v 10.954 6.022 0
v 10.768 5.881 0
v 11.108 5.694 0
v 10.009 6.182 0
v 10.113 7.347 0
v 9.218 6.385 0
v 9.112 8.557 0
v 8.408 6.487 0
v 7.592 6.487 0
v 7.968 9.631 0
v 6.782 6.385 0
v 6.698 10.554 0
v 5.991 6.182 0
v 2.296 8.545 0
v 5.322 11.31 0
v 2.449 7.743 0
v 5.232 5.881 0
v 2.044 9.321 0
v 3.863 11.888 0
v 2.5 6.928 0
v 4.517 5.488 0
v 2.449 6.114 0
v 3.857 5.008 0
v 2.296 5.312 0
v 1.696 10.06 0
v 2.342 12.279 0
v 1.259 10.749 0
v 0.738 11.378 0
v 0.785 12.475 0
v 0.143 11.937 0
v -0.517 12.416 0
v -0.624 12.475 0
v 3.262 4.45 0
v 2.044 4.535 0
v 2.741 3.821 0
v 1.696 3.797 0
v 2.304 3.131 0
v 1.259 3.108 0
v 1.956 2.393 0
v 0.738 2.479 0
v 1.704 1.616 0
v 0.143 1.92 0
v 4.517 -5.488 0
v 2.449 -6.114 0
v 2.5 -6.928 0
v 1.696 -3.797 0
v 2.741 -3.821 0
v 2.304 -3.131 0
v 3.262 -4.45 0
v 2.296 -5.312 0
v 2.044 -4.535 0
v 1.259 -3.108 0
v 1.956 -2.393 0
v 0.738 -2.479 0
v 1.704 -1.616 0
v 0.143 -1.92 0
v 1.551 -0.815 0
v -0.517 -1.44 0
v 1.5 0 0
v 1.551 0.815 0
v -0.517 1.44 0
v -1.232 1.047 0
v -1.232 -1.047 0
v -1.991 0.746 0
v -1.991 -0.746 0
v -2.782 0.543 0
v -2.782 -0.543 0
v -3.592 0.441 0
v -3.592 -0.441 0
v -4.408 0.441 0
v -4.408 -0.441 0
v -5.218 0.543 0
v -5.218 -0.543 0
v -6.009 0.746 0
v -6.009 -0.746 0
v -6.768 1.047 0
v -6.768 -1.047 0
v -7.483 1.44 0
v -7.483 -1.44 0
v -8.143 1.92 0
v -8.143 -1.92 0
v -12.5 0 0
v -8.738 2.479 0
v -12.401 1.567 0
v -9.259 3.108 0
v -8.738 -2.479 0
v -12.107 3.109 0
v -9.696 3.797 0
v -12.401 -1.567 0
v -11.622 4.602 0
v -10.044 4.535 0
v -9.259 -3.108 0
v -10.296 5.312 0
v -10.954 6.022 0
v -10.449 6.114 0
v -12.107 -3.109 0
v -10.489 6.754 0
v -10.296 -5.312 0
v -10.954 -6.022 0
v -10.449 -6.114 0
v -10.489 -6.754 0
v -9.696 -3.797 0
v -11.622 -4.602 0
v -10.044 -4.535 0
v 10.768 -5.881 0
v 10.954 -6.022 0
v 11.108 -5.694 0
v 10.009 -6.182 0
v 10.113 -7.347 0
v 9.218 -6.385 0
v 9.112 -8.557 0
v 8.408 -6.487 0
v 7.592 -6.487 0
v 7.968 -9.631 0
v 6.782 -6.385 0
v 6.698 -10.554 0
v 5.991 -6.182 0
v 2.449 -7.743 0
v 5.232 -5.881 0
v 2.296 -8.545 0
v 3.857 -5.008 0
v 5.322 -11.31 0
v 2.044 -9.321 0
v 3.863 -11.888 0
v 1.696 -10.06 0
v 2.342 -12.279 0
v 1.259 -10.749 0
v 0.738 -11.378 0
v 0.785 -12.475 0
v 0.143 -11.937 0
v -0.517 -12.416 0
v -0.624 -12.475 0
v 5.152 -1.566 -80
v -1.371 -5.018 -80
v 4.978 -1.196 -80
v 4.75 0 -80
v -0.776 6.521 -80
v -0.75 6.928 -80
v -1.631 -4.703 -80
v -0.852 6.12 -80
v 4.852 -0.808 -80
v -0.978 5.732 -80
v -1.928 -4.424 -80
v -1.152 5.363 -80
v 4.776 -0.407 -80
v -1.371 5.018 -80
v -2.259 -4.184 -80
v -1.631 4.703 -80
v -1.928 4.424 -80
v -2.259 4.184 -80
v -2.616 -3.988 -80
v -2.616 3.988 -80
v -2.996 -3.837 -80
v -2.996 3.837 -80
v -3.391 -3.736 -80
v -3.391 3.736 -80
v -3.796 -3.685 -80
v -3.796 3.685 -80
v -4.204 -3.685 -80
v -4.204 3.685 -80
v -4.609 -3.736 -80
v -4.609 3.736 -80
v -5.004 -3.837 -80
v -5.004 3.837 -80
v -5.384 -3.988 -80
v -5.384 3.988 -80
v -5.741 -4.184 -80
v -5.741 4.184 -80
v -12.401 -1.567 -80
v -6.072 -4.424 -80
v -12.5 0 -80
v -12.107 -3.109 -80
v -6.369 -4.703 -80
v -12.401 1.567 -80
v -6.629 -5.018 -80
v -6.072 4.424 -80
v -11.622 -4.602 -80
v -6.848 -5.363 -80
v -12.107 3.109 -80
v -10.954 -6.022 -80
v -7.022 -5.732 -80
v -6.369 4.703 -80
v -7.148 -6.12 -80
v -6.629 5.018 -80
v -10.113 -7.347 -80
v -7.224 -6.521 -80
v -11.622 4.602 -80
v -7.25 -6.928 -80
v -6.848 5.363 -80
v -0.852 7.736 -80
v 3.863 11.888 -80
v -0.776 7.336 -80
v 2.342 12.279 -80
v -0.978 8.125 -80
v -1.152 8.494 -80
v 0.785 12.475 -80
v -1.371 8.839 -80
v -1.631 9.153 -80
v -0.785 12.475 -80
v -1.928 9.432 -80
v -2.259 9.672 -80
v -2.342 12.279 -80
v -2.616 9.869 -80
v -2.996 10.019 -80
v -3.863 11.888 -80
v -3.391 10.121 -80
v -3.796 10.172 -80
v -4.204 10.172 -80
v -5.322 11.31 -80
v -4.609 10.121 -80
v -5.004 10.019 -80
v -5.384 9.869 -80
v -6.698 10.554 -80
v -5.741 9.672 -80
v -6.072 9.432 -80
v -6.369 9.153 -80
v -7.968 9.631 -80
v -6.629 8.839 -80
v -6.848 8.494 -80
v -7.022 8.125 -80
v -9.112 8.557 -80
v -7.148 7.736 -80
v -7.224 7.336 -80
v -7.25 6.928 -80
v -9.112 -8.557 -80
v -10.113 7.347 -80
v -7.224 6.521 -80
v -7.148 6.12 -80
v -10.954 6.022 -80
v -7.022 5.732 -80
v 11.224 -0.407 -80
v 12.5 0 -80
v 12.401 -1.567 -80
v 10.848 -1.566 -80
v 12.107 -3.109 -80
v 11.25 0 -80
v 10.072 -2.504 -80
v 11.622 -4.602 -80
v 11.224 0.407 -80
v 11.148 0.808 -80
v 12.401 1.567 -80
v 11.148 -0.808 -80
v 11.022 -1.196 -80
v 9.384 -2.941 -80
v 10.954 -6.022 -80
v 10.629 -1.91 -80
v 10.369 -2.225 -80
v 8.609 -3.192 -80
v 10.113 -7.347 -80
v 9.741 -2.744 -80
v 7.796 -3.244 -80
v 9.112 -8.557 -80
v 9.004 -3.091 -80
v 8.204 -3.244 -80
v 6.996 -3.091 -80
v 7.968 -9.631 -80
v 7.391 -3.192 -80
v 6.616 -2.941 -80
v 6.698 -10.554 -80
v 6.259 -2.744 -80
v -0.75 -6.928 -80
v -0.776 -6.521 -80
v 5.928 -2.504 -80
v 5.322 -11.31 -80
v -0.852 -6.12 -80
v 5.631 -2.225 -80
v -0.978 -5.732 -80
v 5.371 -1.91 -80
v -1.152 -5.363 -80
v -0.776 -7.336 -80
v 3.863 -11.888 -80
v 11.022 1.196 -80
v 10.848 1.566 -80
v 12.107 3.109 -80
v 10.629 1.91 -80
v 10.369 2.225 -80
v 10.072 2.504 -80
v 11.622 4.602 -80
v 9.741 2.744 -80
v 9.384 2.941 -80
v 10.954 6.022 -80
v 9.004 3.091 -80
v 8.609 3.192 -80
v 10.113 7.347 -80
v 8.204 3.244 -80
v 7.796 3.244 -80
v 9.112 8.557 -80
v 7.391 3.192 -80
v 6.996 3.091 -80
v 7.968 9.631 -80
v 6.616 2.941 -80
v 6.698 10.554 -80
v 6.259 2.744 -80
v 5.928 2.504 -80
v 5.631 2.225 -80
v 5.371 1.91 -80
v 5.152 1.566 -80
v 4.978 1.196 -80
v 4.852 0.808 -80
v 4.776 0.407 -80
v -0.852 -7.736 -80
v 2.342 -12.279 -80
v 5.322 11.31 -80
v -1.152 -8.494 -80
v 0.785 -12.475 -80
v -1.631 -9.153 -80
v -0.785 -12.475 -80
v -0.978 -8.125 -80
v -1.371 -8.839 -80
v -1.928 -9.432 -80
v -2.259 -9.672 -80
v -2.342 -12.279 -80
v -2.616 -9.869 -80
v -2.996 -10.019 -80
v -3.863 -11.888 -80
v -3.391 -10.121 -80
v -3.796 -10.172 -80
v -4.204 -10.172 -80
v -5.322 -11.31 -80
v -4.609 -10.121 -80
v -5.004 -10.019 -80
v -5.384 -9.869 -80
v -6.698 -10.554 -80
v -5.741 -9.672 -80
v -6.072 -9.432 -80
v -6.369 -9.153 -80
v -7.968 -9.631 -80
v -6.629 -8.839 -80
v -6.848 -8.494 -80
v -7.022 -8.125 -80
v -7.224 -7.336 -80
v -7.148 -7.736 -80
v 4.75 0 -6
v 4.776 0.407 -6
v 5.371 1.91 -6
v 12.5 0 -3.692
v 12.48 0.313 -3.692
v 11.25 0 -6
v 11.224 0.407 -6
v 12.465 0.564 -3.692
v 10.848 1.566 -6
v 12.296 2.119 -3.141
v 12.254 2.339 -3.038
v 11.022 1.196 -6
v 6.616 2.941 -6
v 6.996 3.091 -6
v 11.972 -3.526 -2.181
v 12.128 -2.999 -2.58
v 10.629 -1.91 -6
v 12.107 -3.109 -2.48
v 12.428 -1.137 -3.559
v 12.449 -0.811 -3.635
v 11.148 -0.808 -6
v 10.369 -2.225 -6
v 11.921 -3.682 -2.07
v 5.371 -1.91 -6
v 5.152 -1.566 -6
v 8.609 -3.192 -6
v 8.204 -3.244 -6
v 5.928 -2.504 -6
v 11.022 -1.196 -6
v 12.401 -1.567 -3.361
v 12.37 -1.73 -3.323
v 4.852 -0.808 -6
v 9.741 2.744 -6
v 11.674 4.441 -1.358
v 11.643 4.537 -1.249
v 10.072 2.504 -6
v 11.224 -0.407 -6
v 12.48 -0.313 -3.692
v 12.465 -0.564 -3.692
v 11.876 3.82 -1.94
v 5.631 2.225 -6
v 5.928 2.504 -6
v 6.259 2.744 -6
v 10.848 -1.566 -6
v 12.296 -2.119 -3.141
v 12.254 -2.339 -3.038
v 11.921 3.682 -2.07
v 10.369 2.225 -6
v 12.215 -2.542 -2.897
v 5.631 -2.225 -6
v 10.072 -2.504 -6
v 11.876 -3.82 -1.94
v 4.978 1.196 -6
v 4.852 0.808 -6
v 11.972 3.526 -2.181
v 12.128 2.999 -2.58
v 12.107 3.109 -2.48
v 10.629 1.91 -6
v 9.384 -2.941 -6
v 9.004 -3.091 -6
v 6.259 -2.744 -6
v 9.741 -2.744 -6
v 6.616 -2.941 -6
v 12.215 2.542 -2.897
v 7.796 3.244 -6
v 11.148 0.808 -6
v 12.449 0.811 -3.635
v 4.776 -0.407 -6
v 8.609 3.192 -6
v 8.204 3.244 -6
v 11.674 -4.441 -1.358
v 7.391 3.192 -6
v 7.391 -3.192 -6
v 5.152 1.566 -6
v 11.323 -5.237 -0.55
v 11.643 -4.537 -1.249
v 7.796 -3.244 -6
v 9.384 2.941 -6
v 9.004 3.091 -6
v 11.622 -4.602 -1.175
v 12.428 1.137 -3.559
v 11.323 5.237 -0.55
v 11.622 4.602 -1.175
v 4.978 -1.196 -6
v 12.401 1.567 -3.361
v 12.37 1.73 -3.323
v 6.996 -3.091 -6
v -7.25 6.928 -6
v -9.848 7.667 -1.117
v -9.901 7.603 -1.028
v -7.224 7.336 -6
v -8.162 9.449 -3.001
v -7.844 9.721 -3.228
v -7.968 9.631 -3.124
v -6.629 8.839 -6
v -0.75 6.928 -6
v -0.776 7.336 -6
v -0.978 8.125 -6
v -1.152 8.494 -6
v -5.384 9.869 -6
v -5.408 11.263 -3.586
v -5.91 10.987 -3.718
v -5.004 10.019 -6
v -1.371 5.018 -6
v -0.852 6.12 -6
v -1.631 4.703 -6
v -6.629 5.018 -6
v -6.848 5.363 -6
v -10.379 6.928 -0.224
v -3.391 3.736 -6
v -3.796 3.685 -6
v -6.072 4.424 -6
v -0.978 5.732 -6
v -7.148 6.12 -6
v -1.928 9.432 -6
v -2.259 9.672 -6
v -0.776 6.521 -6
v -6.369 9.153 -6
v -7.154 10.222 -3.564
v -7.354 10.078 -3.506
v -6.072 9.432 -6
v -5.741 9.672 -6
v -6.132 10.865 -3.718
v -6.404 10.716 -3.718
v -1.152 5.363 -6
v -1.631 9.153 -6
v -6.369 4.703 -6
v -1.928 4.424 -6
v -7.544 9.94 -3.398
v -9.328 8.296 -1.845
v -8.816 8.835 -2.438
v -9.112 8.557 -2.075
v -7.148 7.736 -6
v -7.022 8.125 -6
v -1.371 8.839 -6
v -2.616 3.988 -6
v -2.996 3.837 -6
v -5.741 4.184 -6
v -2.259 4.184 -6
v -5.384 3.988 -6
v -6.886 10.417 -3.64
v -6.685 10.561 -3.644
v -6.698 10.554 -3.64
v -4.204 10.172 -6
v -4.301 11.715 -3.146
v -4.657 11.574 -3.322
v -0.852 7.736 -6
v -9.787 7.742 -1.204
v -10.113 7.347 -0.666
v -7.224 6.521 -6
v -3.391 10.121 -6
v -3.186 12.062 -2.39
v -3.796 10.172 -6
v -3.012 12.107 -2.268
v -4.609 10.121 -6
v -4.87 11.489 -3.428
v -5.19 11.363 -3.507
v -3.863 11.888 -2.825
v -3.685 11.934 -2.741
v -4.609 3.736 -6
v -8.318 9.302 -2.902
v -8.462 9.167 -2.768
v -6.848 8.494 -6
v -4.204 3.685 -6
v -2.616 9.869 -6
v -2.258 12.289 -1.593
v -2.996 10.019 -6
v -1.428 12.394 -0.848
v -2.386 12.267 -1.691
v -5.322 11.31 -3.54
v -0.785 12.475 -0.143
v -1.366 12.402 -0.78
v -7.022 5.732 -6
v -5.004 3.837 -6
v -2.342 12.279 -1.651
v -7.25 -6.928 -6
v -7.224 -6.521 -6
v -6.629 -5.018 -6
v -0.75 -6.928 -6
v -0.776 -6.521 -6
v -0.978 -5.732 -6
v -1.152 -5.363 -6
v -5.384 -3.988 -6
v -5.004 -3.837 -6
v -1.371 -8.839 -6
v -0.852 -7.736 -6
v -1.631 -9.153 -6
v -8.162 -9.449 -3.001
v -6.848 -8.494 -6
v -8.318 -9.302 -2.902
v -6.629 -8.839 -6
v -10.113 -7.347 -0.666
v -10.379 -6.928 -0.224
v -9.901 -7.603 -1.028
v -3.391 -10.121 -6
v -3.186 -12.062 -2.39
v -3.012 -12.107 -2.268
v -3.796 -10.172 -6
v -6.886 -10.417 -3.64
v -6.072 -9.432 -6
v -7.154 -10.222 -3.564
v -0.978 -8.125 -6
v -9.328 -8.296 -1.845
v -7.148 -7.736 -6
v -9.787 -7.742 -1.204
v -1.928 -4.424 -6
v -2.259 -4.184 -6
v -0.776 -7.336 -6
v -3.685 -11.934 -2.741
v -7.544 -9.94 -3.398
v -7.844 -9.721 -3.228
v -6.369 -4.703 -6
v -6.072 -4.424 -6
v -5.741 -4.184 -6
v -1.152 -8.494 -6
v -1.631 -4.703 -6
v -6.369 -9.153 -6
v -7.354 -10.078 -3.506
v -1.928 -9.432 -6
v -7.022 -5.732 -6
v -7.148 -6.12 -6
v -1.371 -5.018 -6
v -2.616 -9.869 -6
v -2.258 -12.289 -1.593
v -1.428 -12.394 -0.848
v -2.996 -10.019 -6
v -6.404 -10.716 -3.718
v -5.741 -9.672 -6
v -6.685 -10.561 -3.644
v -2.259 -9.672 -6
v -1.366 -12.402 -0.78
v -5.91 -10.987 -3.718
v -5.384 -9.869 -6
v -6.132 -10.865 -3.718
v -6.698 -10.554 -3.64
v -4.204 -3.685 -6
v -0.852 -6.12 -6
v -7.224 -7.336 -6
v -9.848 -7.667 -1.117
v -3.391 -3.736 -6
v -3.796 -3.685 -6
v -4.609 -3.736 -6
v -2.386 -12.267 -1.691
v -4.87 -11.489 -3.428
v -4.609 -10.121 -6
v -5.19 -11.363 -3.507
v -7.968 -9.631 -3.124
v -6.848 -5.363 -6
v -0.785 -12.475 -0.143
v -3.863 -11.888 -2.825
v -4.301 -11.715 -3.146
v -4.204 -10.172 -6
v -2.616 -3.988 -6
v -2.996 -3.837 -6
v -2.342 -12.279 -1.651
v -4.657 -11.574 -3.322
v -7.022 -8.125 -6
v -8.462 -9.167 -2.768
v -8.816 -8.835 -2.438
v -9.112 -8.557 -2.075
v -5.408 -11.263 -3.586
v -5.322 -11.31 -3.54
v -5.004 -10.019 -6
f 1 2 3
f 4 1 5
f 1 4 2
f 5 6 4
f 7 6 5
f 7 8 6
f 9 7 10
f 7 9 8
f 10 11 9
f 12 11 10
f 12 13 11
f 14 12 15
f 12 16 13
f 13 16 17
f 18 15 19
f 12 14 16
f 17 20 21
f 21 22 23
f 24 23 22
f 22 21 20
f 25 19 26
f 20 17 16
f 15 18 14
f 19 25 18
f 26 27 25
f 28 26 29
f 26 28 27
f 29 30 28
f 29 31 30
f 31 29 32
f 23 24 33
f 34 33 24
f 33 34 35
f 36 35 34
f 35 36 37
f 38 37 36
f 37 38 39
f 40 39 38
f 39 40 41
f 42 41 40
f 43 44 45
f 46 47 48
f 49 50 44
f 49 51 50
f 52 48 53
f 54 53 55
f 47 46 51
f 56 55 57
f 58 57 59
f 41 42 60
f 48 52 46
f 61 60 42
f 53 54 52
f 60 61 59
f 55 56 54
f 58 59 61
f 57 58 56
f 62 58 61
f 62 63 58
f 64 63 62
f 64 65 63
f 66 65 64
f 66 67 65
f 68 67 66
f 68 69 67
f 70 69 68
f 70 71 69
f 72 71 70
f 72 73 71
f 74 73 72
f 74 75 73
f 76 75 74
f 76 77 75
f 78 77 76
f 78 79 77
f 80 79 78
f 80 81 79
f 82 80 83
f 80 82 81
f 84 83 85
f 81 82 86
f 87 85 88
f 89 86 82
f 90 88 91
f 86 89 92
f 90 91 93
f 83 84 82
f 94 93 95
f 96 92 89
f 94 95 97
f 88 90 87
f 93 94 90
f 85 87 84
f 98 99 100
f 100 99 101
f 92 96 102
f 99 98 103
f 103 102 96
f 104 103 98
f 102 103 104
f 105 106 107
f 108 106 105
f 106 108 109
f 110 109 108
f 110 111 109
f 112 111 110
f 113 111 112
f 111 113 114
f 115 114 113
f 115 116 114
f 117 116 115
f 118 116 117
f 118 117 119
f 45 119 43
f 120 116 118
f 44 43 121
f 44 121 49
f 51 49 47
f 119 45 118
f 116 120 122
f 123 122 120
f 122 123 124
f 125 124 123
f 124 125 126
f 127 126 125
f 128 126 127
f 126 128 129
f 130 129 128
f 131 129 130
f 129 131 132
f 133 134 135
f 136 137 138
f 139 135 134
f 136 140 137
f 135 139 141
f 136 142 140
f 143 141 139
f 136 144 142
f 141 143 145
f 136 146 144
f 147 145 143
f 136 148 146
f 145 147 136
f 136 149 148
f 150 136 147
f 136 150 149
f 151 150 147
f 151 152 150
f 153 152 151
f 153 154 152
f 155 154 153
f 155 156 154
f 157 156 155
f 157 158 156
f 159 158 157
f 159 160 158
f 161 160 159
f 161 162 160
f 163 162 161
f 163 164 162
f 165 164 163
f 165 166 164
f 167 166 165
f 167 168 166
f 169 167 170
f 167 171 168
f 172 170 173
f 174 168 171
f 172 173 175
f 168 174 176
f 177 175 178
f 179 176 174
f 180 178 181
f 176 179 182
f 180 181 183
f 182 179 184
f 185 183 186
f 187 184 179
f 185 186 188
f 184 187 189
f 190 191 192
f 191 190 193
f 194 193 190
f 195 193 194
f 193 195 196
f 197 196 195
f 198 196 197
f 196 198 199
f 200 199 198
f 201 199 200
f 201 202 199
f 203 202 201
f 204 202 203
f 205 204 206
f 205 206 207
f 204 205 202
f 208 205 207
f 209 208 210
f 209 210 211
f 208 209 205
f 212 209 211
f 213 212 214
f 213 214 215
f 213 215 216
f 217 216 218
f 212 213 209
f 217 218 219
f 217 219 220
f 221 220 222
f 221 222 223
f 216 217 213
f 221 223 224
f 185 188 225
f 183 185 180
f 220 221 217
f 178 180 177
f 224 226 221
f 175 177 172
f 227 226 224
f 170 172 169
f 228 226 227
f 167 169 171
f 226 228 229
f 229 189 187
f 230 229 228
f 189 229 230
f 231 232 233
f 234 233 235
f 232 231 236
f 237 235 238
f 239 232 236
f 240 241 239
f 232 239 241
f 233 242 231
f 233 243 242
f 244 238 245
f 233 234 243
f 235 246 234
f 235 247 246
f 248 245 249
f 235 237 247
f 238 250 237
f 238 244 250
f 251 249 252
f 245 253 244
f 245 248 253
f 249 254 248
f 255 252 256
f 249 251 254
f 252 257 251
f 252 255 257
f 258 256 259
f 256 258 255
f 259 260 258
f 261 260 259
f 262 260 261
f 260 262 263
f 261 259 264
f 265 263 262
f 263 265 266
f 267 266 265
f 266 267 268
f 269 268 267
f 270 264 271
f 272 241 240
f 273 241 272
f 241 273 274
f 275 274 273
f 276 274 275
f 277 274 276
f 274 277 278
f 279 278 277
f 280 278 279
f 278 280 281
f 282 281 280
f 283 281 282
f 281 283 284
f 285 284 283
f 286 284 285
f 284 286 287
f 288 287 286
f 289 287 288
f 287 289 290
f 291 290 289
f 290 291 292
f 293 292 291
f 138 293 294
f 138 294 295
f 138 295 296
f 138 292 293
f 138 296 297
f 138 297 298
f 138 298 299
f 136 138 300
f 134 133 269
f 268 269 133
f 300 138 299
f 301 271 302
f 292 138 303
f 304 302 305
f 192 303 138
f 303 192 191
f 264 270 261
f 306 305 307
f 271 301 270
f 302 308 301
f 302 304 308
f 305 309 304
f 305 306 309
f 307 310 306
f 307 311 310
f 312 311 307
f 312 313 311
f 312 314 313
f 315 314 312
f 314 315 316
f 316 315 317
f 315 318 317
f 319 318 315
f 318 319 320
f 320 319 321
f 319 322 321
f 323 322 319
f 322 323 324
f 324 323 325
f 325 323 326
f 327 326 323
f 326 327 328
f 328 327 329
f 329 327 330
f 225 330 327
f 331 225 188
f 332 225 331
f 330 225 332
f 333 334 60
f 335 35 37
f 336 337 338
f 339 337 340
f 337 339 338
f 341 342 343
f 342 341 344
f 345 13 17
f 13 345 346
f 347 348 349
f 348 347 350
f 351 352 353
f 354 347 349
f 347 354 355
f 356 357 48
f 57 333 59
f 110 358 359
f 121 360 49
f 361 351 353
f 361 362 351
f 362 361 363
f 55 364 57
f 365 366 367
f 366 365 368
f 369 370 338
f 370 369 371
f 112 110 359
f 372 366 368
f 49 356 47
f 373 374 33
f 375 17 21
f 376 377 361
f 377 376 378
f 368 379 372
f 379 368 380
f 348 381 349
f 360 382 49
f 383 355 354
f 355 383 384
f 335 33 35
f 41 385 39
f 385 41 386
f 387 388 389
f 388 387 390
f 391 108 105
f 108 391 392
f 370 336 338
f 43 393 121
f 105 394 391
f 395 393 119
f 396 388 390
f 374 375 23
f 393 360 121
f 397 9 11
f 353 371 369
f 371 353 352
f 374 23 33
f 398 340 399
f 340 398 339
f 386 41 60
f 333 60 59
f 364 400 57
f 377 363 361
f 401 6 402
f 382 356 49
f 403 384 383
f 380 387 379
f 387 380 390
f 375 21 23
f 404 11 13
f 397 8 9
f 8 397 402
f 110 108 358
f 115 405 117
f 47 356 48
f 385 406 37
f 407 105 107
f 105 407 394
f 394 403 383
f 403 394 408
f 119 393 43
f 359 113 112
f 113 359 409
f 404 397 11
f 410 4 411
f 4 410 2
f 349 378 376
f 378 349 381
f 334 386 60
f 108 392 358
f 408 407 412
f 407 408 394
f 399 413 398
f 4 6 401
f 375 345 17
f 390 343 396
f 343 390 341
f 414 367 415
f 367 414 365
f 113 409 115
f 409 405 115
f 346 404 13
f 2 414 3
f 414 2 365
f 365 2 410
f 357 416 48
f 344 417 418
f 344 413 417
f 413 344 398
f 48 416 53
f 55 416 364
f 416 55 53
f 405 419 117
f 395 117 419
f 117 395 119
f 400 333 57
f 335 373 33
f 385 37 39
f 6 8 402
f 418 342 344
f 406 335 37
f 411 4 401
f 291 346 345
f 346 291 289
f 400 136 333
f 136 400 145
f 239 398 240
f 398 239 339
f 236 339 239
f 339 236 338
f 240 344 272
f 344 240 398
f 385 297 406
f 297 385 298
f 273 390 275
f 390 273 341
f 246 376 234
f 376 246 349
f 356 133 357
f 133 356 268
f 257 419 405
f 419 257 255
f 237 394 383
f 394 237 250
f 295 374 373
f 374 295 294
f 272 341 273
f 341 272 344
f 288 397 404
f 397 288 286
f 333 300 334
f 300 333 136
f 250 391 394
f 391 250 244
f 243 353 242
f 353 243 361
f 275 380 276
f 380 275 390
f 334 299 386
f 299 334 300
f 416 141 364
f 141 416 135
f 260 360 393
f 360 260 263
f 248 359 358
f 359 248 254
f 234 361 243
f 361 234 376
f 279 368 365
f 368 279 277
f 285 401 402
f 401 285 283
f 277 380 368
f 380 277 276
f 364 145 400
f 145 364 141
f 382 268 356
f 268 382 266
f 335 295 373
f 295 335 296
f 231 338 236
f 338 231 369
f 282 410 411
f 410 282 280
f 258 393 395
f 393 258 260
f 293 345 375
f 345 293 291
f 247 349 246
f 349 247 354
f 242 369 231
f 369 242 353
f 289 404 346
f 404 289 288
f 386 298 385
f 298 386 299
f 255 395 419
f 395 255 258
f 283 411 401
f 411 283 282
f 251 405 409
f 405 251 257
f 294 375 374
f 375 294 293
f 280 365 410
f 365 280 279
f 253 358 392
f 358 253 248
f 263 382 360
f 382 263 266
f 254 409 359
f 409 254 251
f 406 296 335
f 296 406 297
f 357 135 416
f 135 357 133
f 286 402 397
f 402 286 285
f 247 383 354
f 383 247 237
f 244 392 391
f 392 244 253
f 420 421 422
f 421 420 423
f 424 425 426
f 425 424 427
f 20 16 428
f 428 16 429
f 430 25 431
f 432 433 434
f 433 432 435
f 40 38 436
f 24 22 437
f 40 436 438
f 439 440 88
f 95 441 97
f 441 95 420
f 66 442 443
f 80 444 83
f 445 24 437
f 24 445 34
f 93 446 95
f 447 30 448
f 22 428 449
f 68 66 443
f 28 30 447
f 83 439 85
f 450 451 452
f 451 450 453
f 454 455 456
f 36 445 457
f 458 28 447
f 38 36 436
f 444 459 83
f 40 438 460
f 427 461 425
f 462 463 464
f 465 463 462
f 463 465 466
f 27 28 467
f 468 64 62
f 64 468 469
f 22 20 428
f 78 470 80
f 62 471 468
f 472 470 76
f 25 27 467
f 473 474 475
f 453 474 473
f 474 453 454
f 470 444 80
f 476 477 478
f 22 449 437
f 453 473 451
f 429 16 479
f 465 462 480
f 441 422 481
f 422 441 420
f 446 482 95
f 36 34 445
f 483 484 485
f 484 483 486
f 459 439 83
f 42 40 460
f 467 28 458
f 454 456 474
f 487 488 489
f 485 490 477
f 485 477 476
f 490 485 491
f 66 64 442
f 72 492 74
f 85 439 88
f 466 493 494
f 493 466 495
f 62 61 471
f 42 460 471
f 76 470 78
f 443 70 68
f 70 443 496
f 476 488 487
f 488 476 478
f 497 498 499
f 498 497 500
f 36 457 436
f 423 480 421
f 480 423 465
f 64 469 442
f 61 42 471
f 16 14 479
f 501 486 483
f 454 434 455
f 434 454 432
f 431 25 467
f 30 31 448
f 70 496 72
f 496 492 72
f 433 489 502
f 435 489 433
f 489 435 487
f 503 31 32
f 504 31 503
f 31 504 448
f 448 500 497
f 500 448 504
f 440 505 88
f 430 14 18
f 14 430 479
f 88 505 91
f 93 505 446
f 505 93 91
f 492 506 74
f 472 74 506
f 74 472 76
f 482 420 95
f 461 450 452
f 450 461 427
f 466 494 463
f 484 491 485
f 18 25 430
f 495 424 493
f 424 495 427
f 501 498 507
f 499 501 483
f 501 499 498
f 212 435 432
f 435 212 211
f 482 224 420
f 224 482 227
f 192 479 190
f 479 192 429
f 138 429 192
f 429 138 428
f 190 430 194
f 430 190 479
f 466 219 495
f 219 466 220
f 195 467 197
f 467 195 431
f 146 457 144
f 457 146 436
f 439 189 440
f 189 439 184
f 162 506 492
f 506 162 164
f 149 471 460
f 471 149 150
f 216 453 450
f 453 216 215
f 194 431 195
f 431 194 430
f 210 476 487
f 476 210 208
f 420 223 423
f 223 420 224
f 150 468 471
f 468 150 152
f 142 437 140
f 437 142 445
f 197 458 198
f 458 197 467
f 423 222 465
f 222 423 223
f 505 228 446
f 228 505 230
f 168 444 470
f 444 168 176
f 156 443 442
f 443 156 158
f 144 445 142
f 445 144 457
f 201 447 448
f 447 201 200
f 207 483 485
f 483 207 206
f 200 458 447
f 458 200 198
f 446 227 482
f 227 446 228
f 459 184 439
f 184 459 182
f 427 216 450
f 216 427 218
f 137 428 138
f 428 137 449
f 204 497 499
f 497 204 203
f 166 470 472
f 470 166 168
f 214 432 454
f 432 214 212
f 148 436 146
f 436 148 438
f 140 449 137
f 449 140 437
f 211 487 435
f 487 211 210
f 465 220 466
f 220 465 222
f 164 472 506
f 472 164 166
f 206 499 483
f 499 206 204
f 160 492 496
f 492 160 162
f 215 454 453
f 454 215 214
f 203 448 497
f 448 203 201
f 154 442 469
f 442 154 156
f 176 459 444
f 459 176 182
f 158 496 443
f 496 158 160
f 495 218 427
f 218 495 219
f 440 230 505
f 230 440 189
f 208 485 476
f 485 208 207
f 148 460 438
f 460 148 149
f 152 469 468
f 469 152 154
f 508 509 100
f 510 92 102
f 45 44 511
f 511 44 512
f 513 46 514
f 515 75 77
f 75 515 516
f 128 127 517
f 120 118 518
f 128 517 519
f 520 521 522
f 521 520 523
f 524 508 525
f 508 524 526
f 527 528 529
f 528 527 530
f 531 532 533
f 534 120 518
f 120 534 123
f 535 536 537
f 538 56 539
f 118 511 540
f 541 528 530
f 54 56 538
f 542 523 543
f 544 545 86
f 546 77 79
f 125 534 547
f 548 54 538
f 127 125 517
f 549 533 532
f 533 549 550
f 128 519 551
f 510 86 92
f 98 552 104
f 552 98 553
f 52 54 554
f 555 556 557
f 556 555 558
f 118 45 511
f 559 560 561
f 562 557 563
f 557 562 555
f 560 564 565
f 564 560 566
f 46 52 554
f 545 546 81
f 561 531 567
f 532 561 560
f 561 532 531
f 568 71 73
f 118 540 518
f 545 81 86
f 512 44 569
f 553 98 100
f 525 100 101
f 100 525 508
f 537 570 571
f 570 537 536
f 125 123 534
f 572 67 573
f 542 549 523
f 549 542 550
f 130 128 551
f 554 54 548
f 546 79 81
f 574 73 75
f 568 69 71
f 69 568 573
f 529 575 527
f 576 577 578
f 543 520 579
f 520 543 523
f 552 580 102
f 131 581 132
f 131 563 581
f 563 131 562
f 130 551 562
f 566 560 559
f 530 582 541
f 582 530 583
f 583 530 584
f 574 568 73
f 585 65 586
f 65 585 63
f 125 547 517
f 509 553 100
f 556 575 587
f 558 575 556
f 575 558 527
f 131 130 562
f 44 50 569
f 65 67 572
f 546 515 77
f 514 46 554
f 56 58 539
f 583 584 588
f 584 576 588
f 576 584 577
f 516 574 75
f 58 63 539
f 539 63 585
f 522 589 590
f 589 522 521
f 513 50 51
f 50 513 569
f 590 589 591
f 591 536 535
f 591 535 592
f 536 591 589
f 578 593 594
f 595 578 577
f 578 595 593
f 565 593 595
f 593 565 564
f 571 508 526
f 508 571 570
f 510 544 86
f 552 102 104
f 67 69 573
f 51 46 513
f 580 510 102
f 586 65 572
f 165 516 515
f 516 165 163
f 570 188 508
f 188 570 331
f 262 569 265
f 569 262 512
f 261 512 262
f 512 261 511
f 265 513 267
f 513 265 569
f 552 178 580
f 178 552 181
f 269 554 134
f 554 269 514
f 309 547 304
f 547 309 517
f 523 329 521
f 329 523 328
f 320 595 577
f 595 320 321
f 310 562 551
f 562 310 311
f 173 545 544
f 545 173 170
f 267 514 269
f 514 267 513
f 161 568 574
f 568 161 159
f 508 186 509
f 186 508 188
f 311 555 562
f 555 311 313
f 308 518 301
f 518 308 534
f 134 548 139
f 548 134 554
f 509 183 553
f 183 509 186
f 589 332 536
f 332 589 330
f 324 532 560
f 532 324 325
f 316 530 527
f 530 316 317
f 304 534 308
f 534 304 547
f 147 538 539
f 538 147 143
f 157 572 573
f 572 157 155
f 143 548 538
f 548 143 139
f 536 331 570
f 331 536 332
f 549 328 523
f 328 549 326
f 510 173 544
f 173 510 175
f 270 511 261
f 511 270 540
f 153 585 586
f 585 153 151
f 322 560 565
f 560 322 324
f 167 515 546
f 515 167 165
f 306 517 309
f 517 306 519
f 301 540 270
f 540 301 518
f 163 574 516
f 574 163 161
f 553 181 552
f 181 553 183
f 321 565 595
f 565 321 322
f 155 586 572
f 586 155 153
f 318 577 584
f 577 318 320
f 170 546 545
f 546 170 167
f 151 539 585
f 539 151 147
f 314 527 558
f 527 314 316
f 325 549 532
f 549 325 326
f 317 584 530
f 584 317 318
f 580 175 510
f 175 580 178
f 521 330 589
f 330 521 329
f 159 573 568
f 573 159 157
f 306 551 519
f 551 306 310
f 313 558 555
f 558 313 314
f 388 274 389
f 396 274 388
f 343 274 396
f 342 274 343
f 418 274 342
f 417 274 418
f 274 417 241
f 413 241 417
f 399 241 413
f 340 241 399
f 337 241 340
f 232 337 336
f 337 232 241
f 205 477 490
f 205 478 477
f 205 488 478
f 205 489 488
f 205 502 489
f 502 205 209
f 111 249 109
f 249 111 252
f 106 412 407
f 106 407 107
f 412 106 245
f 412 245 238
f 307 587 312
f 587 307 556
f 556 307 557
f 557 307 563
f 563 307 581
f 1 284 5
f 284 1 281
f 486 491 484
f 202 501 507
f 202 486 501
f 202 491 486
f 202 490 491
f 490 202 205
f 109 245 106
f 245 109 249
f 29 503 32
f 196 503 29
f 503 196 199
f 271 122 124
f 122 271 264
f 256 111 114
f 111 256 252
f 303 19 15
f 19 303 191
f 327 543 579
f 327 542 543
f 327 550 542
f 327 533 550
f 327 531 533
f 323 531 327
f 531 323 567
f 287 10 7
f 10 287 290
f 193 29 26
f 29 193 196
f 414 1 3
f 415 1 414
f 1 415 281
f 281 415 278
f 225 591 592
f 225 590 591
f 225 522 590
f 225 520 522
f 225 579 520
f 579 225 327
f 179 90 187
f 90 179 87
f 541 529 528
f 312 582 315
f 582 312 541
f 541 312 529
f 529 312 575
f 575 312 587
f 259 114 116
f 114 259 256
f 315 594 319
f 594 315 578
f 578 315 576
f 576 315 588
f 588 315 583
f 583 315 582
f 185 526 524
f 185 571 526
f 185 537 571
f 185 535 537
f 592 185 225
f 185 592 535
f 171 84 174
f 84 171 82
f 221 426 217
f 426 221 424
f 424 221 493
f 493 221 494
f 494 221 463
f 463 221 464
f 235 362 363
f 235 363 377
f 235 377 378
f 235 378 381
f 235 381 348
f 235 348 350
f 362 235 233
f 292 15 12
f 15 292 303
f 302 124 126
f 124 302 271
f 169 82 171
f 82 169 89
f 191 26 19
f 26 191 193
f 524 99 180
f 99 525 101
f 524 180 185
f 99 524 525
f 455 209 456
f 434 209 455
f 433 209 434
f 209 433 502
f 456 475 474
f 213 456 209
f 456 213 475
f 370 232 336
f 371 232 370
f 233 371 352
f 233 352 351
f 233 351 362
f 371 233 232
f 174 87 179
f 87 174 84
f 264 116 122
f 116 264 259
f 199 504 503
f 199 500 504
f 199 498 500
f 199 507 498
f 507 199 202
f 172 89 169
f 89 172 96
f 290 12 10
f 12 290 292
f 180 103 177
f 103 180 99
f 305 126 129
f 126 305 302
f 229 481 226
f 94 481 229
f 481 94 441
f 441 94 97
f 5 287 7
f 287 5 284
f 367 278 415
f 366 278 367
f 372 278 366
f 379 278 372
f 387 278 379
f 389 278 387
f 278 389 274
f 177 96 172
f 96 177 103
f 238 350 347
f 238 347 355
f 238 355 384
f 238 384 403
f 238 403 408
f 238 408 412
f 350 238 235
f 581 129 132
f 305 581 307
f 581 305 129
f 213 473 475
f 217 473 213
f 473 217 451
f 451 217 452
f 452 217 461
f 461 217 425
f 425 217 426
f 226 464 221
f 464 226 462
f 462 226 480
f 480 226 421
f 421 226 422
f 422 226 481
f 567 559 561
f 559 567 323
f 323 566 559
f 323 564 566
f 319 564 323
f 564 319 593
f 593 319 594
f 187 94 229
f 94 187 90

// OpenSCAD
$fn = 50;


difference() {
	union() {
		translate(v = [0, 0, -80.0000000000]) {
			cylinder(h = 80, r = 12.5000000000);
		}
	}
	union() {
		translate(v = [8.0000000000, 0.0000000000, 0]) {
			rotate(a = [0, 0, 0]) {
				difference() {
					union() {
						#translate(v = [0, 0, -80.0000000000]) {
							cylinder(h = 80, r = 2.2500000000);
						}
						#translate(v = [0, 0, -6]) {
							cylinder(h = 6, r = 12.5000000000, r1 = 3.2500000000, r2 = 6.5000000000);
						}
						#translate(v = [0, 0, -80.0000000000]) {
							cylinder(h = 80, r = 3.2500000000);
						}
						#translate(v = [0, 0, -80.0000000000]) {
							cylinder(h = 80, r = 2.2500000000);
						}
					}
					union();
				}
			}
		}
		translate(v = [-4.0000000000, 6.9282032303, 0]) {
			rotate(a = [0, 0, 0]) {
				difference() {
					union() {
						#translate(v = [0, 0, -80.0000000000]) {
							cylinder(h = 80, r = 2.2500000000);
						}
						#translate(v = [0, 0, -6]) {
							cylinder(h = 6, r = 12.5000000000, r1 = 3.2500000000, r2 = 6.5000000000);
						}
						#translate(v = [0, 0, -80.0000000000]) {
							cylinder(h = 80, r = 3.2500000000);
						}
						#translate(v = [0, 0, -80.0000000000]) {
							cylinder(h = 80, r = 2.2500000000);
						}
					}
					union();
				}
			}
		}
		translate(v = [-4.0000000000, -6.9282032303, 0]) {
			rotate(a = [0, 0, 0]) {
				difference() {
					union() {
						#translate(v = [0, 0, -80.0000000000]) {
							cylinder(h = 80, r = 2.2500000000);
						}
						#translate(v = [0, 0, -6]) {
							cylinder(h = 6, r = 12.5000000000, r1 = 3.2500000000, r2 = 6.5000000000);
						}
						#translate(v = [0, 0, -80.0000000000]) {
							cylinder(h = 80, r = 3.2500000000);
						}
						#translate(v = [0, 0, -80.0000000000]) {
							cylinder(h = 80, r = 2.2500000000);
						}
					}
					union();
				}
			}
		}
	}
}
